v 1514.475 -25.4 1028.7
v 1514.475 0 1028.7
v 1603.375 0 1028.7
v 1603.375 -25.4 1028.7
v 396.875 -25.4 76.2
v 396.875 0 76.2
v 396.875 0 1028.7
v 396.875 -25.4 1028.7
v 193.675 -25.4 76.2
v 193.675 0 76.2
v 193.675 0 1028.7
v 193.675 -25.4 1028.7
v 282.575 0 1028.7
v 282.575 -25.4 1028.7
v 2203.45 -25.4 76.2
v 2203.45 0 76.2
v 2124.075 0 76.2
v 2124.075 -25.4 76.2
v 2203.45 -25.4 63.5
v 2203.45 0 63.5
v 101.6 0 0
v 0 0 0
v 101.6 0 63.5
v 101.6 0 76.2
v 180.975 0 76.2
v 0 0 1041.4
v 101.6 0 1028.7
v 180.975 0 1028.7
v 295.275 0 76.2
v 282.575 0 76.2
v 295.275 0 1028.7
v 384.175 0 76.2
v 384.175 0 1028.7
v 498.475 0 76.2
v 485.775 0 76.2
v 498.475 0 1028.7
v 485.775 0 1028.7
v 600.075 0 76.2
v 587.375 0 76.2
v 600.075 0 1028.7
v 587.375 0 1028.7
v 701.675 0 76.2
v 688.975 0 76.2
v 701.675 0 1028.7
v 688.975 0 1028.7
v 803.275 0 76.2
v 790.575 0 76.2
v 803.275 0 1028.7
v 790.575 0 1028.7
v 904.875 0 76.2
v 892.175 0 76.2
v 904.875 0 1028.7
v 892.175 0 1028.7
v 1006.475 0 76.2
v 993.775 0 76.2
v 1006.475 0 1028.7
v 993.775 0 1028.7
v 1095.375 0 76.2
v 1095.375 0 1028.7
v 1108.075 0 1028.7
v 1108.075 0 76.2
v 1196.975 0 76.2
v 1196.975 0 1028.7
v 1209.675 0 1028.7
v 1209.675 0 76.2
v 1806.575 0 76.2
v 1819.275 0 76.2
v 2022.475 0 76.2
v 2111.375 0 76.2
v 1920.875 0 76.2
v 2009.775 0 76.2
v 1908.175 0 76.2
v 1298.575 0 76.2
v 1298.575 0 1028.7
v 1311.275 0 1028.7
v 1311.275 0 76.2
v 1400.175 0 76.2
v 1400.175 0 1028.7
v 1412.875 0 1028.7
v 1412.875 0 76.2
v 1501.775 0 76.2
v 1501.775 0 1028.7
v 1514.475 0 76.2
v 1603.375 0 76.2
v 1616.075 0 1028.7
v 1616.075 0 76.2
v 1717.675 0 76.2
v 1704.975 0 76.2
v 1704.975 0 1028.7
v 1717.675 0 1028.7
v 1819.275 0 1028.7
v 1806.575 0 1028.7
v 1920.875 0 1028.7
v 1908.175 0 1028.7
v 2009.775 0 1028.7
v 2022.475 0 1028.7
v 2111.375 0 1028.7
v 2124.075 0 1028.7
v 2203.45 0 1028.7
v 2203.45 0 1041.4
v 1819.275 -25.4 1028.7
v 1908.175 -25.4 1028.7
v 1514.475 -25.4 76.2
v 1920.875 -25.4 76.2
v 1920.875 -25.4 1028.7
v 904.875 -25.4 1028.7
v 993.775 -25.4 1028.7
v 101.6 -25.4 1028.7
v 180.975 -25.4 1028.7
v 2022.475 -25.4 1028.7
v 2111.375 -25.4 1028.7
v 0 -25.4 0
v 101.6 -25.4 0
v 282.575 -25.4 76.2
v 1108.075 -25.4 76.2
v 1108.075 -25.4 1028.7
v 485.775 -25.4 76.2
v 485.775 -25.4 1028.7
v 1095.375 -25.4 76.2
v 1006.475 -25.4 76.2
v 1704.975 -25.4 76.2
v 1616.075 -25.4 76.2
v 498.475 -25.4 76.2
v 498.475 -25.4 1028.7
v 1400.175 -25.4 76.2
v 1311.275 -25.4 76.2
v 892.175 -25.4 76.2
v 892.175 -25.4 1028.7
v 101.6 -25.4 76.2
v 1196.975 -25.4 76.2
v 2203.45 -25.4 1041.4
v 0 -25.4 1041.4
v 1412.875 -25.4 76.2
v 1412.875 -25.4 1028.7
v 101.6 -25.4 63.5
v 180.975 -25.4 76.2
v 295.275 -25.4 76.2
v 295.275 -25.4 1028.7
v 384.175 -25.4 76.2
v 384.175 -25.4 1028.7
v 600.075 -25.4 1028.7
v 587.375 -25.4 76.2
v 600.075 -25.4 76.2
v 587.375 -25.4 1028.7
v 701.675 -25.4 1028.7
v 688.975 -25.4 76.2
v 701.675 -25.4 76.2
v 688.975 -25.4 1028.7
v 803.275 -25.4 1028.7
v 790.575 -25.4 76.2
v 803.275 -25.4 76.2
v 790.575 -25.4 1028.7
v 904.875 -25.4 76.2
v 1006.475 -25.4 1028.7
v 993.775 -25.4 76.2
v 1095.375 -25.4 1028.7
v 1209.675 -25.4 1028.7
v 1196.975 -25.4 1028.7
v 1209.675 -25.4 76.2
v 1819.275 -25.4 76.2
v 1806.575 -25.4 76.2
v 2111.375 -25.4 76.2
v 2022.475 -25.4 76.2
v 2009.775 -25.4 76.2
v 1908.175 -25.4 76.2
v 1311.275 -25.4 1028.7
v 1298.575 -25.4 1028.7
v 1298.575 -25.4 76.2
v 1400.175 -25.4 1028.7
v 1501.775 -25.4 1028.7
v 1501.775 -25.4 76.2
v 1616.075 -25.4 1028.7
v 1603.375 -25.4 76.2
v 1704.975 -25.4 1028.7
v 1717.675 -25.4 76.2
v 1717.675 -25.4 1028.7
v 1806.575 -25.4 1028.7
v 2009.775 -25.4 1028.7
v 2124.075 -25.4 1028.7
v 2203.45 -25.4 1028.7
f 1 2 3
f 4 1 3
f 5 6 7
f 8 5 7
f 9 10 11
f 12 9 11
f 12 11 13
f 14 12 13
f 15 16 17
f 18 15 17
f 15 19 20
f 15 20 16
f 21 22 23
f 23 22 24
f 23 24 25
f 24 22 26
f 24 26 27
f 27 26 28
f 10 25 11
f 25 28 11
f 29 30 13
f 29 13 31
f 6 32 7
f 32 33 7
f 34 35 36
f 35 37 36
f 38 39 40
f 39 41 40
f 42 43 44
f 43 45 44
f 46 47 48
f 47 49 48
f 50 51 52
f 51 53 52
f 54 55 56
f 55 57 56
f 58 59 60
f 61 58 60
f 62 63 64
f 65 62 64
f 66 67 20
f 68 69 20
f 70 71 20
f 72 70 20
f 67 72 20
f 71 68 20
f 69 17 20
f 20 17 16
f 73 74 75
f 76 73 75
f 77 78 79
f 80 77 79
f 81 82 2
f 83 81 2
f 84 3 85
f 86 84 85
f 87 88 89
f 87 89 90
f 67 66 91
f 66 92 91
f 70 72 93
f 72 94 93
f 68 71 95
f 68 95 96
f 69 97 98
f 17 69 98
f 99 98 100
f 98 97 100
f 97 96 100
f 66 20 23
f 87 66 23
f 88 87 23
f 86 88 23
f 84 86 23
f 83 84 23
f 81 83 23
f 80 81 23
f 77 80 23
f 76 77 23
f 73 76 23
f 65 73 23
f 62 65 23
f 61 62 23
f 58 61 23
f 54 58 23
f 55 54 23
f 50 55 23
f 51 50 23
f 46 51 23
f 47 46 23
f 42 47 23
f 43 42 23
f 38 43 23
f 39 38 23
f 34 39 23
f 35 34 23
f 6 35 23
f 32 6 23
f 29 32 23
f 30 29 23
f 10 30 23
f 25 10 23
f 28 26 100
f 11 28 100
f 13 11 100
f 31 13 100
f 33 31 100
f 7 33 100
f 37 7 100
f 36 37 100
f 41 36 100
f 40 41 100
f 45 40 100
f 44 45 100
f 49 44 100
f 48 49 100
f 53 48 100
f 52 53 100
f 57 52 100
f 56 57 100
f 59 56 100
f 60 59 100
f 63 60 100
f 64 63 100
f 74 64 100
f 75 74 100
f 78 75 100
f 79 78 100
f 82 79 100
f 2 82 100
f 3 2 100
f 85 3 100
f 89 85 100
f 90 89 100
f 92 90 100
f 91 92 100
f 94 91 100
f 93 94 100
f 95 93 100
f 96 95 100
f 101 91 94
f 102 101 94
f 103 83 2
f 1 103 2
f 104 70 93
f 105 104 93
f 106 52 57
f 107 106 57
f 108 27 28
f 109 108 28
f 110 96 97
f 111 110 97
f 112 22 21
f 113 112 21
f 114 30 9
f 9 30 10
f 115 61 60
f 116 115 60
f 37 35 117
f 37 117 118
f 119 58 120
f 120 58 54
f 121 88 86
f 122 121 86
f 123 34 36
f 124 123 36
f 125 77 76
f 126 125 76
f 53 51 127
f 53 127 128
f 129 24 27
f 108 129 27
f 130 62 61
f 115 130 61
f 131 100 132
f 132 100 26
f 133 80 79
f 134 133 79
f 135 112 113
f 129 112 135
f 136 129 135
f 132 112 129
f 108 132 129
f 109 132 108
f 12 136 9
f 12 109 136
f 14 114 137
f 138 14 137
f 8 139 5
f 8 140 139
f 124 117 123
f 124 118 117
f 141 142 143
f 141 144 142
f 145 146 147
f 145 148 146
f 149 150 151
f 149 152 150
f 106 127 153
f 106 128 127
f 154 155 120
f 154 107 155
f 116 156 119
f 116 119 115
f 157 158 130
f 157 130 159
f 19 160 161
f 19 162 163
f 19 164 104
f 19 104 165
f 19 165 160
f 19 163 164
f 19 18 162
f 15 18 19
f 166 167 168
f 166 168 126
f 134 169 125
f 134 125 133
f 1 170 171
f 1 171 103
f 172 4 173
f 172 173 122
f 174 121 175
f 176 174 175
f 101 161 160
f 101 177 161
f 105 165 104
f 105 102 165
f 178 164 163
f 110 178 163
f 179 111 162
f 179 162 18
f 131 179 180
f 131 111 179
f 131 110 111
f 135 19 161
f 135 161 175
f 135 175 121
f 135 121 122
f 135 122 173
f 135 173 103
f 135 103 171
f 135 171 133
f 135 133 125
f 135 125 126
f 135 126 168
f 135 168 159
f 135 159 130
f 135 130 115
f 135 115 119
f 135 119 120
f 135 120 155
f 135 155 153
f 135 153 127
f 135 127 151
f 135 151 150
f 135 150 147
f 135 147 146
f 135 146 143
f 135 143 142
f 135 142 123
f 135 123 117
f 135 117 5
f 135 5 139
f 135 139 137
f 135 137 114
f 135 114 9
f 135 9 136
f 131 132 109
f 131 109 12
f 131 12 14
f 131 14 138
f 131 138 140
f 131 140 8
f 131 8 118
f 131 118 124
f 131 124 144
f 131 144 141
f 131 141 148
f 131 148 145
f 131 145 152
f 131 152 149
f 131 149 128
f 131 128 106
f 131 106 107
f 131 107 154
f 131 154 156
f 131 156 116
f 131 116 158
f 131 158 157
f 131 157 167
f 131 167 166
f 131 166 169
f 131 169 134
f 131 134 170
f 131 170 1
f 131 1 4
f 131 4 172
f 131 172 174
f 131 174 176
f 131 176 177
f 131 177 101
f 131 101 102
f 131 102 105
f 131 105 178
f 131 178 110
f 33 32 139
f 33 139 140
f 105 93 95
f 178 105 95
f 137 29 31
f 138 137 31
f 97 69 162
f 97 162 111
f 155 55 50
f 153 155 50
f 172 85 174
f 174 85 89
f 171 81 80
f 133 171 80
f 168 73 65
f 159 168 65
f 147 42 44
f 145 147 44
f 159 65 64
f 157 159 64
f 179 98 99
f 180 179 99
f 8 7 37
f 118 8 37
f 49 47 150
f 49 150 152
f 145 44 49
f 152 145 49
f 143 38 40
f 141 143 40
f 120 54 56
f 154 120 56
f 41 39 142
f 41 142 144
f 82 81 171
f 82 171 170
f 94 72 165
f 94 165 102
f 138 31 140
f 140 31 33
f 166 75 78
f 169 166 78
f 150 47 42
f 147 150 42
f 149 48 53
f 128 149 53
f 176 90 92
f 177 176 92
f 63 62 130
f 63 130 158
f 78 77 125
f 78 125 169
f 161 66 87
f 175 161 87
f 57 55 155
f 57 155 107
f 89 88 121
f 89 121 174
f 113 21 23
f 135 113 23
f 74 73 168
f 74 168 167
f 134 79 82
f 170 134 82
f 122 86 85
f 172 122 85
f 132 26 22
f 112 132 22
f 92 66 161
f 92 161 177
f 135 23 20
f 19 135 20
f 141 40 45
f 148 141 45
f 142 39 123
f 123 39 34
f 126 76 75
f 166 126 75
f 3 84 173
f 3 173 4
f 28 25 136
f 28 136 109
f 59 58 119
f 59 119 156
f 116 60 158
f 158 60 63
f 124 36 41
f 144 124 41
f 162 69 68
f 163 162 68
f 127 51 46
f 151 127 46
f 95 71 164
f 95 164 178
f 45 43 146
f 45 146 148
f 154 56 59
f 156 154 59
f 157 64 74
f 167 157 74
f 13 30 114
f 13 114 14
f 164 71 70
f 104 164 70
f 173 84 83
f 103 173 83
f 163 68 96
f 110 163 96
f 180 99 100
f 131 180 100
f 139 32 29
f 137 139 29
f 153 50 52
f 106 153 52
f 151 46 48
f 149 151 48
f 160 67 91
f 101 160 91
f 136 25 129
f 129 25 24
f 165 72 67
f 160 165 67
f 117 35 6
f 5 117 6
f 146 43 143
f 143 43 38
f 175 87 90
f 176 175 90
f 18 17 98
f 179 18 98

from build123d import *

# Parameters (mm, degrees)
F0_W     = 12.7
F0_H     = 952.5
F1_DEPTH = 25.4


# Not quite as in the source:
# - a feature names something its author has since deleted; it is built from what else it names


with BuildPart() as f1:
    # F0 (on Front) → F1 (new body)
    with BuildSketch(Plane.XZ):
        Polygon((0, 1041.4), (0, 0), (101.6, 0), (101.6, 63.5), (101.6, 76.2), (101.6, 1028.7), (101.6, 1041.4), align=None)
        Polygon((101.6, 76.2), (101.6, 63.5), (2203.45, 63.5), (2203.45, 76.2), (2124.075, 76.2), (2111.375, 76.2), (2022.475, 76.2), (2009.775, 76.2), (1920.875, 76.2), (1908.175, 76.2), (1819.275, 76.2), (1806.575, 76.2), (1717.675, 76.2), (1704.975, 76.2), (1616.075, 76.2), (1603.375, 76.2), (1514.475, 76.2), (1501.775, 76.2), (1412.875, 76.2), (1400.175, 76.2), (1311.275, 76.2), (1298.575, 76.2), (1209.675, 76.2), (1196.975, 76.2), (1108.075, 76.2), (1095.375, 76.2), (1006.475, 76.2), (993.775, 76.2), (904.875, 76.2), (892.175, 76.2), (803.275, 76.2), (790.575, 76.2), (701.675, 76.2), (688.975, 76.2), (600.075, 76.2), (587.375, 76.2), (498.475, 76.2), (485.775, 76.2), (396.875, 76.2), (384.175, 76.2), (295.275, 76.2), (282.575, 76.2), (193.675, 76.2), (180.975, 76.2), align=None)
        with Locations((187.325, 552.45)):
            Rectangle(F0_W, F0_H)
        with Locations((288.925, 552.45)):
            Rectangle(F0_W, F0_H)
        with Locations((390.525, 552.45)):
            Rectangle(F0_W, F0_H)
        with Locations((492.125, 552.45)):
            Rectangle(F0_W, F0_H)
        with Locations((593.725, 552.45)):
            Rectangle(F0_W, F0_H)
        with Locations((695.325, 552.45)):
            Rectangle(F0_W, F0_H)
        with Locations((796.925, 552.45)):
            Rectangle(F0_W, F0_H)
        with Locations((898.525, 552.45)):
            Rectangle(F0_W, F0_H)
        with Locations((1000.125, 552.45)):
            Rectangle(F0_W, F0_H)
        with Locations((1101.725, 552.45)):
            Rectangle(F0_W, F0_H)
        with Locations((1203.325, 552.45)):
            Rectangle(F0_W, F0_H)
        with Locations((1304.925, 552.45)):
            Rectangle(F0_W, F0_H)
        with Locations((1406.525, 552.45)):
            Rectangle(F0_W, F0_H)
        with Locations((1508.125, 552.45)):
            Rectangle(F0_W, F0_H)
        with Locations((1609.725, 552.45)):
            Rectangle(F0_W, F0_H)
        with Locations((1711.325, 552.45)):
            Rectangle(F0_W, F0_H)
        with Locations((1812.925, 552.45)):
            Rectangle(F0_W, F0_H)
        with Locations((1914.525, 552.45)):
            Rectangle(F0_W, F0_H)
        Polygon((2203.45, 1041.4), (101.6, 1041.4), (101.6, 1028.7), (180.975, 1028.7), (193.675, 1028.7), (282.575, 1028.7), (295.275, 1028.7), (384.175, 1028.7), (396.875, 1028.7), (485.775, 1028.7), (498.475, 1028.7), (587.375, 1028.7), (600.075, 1028.7), (688.975, 1028.7), (701.675, 1028.7), (790.575, 1028.7), (803.275, 1028.7), (892.175, 1028.7), (904.875, 1028.7), (993.775, 1028.7), (1006.475, 1028.7), (1095.375, 1028.7), (1108.075, 1028.7), (1196.975, 1028.7), (1209.675, 1028.7), (1298.575, 1028.7), (1311.275, 1028.7), (1400.175, 1028.7), (1412.875, 1028.7), (1501.775, 1028.7), (1514.475, 1028.7), (1603.375, 1028.7), (1616.075, 1028.7), (1704.975, 1028.7), (1717.675, 1028.7), (1806.575, 1028.7), (1819.275, 1028.7), (1908.175, 1028.7), (1920.875, 1028.7), (2009.775, 1028.7), (2022.475, 1028.7), (2111.375, 1028.7), (2124.075, 1028.7), (2203.45, 1028.7), align=None)
        with Locations((2016.125, 552.45)):
            Rectangle(F0_W, F0_H)
        with Locations((2117.725, 552.45)):
            Rectangle(F0_W, F0_H)
    extrude(amount=F1_DEPTH)


solid = f1.part
